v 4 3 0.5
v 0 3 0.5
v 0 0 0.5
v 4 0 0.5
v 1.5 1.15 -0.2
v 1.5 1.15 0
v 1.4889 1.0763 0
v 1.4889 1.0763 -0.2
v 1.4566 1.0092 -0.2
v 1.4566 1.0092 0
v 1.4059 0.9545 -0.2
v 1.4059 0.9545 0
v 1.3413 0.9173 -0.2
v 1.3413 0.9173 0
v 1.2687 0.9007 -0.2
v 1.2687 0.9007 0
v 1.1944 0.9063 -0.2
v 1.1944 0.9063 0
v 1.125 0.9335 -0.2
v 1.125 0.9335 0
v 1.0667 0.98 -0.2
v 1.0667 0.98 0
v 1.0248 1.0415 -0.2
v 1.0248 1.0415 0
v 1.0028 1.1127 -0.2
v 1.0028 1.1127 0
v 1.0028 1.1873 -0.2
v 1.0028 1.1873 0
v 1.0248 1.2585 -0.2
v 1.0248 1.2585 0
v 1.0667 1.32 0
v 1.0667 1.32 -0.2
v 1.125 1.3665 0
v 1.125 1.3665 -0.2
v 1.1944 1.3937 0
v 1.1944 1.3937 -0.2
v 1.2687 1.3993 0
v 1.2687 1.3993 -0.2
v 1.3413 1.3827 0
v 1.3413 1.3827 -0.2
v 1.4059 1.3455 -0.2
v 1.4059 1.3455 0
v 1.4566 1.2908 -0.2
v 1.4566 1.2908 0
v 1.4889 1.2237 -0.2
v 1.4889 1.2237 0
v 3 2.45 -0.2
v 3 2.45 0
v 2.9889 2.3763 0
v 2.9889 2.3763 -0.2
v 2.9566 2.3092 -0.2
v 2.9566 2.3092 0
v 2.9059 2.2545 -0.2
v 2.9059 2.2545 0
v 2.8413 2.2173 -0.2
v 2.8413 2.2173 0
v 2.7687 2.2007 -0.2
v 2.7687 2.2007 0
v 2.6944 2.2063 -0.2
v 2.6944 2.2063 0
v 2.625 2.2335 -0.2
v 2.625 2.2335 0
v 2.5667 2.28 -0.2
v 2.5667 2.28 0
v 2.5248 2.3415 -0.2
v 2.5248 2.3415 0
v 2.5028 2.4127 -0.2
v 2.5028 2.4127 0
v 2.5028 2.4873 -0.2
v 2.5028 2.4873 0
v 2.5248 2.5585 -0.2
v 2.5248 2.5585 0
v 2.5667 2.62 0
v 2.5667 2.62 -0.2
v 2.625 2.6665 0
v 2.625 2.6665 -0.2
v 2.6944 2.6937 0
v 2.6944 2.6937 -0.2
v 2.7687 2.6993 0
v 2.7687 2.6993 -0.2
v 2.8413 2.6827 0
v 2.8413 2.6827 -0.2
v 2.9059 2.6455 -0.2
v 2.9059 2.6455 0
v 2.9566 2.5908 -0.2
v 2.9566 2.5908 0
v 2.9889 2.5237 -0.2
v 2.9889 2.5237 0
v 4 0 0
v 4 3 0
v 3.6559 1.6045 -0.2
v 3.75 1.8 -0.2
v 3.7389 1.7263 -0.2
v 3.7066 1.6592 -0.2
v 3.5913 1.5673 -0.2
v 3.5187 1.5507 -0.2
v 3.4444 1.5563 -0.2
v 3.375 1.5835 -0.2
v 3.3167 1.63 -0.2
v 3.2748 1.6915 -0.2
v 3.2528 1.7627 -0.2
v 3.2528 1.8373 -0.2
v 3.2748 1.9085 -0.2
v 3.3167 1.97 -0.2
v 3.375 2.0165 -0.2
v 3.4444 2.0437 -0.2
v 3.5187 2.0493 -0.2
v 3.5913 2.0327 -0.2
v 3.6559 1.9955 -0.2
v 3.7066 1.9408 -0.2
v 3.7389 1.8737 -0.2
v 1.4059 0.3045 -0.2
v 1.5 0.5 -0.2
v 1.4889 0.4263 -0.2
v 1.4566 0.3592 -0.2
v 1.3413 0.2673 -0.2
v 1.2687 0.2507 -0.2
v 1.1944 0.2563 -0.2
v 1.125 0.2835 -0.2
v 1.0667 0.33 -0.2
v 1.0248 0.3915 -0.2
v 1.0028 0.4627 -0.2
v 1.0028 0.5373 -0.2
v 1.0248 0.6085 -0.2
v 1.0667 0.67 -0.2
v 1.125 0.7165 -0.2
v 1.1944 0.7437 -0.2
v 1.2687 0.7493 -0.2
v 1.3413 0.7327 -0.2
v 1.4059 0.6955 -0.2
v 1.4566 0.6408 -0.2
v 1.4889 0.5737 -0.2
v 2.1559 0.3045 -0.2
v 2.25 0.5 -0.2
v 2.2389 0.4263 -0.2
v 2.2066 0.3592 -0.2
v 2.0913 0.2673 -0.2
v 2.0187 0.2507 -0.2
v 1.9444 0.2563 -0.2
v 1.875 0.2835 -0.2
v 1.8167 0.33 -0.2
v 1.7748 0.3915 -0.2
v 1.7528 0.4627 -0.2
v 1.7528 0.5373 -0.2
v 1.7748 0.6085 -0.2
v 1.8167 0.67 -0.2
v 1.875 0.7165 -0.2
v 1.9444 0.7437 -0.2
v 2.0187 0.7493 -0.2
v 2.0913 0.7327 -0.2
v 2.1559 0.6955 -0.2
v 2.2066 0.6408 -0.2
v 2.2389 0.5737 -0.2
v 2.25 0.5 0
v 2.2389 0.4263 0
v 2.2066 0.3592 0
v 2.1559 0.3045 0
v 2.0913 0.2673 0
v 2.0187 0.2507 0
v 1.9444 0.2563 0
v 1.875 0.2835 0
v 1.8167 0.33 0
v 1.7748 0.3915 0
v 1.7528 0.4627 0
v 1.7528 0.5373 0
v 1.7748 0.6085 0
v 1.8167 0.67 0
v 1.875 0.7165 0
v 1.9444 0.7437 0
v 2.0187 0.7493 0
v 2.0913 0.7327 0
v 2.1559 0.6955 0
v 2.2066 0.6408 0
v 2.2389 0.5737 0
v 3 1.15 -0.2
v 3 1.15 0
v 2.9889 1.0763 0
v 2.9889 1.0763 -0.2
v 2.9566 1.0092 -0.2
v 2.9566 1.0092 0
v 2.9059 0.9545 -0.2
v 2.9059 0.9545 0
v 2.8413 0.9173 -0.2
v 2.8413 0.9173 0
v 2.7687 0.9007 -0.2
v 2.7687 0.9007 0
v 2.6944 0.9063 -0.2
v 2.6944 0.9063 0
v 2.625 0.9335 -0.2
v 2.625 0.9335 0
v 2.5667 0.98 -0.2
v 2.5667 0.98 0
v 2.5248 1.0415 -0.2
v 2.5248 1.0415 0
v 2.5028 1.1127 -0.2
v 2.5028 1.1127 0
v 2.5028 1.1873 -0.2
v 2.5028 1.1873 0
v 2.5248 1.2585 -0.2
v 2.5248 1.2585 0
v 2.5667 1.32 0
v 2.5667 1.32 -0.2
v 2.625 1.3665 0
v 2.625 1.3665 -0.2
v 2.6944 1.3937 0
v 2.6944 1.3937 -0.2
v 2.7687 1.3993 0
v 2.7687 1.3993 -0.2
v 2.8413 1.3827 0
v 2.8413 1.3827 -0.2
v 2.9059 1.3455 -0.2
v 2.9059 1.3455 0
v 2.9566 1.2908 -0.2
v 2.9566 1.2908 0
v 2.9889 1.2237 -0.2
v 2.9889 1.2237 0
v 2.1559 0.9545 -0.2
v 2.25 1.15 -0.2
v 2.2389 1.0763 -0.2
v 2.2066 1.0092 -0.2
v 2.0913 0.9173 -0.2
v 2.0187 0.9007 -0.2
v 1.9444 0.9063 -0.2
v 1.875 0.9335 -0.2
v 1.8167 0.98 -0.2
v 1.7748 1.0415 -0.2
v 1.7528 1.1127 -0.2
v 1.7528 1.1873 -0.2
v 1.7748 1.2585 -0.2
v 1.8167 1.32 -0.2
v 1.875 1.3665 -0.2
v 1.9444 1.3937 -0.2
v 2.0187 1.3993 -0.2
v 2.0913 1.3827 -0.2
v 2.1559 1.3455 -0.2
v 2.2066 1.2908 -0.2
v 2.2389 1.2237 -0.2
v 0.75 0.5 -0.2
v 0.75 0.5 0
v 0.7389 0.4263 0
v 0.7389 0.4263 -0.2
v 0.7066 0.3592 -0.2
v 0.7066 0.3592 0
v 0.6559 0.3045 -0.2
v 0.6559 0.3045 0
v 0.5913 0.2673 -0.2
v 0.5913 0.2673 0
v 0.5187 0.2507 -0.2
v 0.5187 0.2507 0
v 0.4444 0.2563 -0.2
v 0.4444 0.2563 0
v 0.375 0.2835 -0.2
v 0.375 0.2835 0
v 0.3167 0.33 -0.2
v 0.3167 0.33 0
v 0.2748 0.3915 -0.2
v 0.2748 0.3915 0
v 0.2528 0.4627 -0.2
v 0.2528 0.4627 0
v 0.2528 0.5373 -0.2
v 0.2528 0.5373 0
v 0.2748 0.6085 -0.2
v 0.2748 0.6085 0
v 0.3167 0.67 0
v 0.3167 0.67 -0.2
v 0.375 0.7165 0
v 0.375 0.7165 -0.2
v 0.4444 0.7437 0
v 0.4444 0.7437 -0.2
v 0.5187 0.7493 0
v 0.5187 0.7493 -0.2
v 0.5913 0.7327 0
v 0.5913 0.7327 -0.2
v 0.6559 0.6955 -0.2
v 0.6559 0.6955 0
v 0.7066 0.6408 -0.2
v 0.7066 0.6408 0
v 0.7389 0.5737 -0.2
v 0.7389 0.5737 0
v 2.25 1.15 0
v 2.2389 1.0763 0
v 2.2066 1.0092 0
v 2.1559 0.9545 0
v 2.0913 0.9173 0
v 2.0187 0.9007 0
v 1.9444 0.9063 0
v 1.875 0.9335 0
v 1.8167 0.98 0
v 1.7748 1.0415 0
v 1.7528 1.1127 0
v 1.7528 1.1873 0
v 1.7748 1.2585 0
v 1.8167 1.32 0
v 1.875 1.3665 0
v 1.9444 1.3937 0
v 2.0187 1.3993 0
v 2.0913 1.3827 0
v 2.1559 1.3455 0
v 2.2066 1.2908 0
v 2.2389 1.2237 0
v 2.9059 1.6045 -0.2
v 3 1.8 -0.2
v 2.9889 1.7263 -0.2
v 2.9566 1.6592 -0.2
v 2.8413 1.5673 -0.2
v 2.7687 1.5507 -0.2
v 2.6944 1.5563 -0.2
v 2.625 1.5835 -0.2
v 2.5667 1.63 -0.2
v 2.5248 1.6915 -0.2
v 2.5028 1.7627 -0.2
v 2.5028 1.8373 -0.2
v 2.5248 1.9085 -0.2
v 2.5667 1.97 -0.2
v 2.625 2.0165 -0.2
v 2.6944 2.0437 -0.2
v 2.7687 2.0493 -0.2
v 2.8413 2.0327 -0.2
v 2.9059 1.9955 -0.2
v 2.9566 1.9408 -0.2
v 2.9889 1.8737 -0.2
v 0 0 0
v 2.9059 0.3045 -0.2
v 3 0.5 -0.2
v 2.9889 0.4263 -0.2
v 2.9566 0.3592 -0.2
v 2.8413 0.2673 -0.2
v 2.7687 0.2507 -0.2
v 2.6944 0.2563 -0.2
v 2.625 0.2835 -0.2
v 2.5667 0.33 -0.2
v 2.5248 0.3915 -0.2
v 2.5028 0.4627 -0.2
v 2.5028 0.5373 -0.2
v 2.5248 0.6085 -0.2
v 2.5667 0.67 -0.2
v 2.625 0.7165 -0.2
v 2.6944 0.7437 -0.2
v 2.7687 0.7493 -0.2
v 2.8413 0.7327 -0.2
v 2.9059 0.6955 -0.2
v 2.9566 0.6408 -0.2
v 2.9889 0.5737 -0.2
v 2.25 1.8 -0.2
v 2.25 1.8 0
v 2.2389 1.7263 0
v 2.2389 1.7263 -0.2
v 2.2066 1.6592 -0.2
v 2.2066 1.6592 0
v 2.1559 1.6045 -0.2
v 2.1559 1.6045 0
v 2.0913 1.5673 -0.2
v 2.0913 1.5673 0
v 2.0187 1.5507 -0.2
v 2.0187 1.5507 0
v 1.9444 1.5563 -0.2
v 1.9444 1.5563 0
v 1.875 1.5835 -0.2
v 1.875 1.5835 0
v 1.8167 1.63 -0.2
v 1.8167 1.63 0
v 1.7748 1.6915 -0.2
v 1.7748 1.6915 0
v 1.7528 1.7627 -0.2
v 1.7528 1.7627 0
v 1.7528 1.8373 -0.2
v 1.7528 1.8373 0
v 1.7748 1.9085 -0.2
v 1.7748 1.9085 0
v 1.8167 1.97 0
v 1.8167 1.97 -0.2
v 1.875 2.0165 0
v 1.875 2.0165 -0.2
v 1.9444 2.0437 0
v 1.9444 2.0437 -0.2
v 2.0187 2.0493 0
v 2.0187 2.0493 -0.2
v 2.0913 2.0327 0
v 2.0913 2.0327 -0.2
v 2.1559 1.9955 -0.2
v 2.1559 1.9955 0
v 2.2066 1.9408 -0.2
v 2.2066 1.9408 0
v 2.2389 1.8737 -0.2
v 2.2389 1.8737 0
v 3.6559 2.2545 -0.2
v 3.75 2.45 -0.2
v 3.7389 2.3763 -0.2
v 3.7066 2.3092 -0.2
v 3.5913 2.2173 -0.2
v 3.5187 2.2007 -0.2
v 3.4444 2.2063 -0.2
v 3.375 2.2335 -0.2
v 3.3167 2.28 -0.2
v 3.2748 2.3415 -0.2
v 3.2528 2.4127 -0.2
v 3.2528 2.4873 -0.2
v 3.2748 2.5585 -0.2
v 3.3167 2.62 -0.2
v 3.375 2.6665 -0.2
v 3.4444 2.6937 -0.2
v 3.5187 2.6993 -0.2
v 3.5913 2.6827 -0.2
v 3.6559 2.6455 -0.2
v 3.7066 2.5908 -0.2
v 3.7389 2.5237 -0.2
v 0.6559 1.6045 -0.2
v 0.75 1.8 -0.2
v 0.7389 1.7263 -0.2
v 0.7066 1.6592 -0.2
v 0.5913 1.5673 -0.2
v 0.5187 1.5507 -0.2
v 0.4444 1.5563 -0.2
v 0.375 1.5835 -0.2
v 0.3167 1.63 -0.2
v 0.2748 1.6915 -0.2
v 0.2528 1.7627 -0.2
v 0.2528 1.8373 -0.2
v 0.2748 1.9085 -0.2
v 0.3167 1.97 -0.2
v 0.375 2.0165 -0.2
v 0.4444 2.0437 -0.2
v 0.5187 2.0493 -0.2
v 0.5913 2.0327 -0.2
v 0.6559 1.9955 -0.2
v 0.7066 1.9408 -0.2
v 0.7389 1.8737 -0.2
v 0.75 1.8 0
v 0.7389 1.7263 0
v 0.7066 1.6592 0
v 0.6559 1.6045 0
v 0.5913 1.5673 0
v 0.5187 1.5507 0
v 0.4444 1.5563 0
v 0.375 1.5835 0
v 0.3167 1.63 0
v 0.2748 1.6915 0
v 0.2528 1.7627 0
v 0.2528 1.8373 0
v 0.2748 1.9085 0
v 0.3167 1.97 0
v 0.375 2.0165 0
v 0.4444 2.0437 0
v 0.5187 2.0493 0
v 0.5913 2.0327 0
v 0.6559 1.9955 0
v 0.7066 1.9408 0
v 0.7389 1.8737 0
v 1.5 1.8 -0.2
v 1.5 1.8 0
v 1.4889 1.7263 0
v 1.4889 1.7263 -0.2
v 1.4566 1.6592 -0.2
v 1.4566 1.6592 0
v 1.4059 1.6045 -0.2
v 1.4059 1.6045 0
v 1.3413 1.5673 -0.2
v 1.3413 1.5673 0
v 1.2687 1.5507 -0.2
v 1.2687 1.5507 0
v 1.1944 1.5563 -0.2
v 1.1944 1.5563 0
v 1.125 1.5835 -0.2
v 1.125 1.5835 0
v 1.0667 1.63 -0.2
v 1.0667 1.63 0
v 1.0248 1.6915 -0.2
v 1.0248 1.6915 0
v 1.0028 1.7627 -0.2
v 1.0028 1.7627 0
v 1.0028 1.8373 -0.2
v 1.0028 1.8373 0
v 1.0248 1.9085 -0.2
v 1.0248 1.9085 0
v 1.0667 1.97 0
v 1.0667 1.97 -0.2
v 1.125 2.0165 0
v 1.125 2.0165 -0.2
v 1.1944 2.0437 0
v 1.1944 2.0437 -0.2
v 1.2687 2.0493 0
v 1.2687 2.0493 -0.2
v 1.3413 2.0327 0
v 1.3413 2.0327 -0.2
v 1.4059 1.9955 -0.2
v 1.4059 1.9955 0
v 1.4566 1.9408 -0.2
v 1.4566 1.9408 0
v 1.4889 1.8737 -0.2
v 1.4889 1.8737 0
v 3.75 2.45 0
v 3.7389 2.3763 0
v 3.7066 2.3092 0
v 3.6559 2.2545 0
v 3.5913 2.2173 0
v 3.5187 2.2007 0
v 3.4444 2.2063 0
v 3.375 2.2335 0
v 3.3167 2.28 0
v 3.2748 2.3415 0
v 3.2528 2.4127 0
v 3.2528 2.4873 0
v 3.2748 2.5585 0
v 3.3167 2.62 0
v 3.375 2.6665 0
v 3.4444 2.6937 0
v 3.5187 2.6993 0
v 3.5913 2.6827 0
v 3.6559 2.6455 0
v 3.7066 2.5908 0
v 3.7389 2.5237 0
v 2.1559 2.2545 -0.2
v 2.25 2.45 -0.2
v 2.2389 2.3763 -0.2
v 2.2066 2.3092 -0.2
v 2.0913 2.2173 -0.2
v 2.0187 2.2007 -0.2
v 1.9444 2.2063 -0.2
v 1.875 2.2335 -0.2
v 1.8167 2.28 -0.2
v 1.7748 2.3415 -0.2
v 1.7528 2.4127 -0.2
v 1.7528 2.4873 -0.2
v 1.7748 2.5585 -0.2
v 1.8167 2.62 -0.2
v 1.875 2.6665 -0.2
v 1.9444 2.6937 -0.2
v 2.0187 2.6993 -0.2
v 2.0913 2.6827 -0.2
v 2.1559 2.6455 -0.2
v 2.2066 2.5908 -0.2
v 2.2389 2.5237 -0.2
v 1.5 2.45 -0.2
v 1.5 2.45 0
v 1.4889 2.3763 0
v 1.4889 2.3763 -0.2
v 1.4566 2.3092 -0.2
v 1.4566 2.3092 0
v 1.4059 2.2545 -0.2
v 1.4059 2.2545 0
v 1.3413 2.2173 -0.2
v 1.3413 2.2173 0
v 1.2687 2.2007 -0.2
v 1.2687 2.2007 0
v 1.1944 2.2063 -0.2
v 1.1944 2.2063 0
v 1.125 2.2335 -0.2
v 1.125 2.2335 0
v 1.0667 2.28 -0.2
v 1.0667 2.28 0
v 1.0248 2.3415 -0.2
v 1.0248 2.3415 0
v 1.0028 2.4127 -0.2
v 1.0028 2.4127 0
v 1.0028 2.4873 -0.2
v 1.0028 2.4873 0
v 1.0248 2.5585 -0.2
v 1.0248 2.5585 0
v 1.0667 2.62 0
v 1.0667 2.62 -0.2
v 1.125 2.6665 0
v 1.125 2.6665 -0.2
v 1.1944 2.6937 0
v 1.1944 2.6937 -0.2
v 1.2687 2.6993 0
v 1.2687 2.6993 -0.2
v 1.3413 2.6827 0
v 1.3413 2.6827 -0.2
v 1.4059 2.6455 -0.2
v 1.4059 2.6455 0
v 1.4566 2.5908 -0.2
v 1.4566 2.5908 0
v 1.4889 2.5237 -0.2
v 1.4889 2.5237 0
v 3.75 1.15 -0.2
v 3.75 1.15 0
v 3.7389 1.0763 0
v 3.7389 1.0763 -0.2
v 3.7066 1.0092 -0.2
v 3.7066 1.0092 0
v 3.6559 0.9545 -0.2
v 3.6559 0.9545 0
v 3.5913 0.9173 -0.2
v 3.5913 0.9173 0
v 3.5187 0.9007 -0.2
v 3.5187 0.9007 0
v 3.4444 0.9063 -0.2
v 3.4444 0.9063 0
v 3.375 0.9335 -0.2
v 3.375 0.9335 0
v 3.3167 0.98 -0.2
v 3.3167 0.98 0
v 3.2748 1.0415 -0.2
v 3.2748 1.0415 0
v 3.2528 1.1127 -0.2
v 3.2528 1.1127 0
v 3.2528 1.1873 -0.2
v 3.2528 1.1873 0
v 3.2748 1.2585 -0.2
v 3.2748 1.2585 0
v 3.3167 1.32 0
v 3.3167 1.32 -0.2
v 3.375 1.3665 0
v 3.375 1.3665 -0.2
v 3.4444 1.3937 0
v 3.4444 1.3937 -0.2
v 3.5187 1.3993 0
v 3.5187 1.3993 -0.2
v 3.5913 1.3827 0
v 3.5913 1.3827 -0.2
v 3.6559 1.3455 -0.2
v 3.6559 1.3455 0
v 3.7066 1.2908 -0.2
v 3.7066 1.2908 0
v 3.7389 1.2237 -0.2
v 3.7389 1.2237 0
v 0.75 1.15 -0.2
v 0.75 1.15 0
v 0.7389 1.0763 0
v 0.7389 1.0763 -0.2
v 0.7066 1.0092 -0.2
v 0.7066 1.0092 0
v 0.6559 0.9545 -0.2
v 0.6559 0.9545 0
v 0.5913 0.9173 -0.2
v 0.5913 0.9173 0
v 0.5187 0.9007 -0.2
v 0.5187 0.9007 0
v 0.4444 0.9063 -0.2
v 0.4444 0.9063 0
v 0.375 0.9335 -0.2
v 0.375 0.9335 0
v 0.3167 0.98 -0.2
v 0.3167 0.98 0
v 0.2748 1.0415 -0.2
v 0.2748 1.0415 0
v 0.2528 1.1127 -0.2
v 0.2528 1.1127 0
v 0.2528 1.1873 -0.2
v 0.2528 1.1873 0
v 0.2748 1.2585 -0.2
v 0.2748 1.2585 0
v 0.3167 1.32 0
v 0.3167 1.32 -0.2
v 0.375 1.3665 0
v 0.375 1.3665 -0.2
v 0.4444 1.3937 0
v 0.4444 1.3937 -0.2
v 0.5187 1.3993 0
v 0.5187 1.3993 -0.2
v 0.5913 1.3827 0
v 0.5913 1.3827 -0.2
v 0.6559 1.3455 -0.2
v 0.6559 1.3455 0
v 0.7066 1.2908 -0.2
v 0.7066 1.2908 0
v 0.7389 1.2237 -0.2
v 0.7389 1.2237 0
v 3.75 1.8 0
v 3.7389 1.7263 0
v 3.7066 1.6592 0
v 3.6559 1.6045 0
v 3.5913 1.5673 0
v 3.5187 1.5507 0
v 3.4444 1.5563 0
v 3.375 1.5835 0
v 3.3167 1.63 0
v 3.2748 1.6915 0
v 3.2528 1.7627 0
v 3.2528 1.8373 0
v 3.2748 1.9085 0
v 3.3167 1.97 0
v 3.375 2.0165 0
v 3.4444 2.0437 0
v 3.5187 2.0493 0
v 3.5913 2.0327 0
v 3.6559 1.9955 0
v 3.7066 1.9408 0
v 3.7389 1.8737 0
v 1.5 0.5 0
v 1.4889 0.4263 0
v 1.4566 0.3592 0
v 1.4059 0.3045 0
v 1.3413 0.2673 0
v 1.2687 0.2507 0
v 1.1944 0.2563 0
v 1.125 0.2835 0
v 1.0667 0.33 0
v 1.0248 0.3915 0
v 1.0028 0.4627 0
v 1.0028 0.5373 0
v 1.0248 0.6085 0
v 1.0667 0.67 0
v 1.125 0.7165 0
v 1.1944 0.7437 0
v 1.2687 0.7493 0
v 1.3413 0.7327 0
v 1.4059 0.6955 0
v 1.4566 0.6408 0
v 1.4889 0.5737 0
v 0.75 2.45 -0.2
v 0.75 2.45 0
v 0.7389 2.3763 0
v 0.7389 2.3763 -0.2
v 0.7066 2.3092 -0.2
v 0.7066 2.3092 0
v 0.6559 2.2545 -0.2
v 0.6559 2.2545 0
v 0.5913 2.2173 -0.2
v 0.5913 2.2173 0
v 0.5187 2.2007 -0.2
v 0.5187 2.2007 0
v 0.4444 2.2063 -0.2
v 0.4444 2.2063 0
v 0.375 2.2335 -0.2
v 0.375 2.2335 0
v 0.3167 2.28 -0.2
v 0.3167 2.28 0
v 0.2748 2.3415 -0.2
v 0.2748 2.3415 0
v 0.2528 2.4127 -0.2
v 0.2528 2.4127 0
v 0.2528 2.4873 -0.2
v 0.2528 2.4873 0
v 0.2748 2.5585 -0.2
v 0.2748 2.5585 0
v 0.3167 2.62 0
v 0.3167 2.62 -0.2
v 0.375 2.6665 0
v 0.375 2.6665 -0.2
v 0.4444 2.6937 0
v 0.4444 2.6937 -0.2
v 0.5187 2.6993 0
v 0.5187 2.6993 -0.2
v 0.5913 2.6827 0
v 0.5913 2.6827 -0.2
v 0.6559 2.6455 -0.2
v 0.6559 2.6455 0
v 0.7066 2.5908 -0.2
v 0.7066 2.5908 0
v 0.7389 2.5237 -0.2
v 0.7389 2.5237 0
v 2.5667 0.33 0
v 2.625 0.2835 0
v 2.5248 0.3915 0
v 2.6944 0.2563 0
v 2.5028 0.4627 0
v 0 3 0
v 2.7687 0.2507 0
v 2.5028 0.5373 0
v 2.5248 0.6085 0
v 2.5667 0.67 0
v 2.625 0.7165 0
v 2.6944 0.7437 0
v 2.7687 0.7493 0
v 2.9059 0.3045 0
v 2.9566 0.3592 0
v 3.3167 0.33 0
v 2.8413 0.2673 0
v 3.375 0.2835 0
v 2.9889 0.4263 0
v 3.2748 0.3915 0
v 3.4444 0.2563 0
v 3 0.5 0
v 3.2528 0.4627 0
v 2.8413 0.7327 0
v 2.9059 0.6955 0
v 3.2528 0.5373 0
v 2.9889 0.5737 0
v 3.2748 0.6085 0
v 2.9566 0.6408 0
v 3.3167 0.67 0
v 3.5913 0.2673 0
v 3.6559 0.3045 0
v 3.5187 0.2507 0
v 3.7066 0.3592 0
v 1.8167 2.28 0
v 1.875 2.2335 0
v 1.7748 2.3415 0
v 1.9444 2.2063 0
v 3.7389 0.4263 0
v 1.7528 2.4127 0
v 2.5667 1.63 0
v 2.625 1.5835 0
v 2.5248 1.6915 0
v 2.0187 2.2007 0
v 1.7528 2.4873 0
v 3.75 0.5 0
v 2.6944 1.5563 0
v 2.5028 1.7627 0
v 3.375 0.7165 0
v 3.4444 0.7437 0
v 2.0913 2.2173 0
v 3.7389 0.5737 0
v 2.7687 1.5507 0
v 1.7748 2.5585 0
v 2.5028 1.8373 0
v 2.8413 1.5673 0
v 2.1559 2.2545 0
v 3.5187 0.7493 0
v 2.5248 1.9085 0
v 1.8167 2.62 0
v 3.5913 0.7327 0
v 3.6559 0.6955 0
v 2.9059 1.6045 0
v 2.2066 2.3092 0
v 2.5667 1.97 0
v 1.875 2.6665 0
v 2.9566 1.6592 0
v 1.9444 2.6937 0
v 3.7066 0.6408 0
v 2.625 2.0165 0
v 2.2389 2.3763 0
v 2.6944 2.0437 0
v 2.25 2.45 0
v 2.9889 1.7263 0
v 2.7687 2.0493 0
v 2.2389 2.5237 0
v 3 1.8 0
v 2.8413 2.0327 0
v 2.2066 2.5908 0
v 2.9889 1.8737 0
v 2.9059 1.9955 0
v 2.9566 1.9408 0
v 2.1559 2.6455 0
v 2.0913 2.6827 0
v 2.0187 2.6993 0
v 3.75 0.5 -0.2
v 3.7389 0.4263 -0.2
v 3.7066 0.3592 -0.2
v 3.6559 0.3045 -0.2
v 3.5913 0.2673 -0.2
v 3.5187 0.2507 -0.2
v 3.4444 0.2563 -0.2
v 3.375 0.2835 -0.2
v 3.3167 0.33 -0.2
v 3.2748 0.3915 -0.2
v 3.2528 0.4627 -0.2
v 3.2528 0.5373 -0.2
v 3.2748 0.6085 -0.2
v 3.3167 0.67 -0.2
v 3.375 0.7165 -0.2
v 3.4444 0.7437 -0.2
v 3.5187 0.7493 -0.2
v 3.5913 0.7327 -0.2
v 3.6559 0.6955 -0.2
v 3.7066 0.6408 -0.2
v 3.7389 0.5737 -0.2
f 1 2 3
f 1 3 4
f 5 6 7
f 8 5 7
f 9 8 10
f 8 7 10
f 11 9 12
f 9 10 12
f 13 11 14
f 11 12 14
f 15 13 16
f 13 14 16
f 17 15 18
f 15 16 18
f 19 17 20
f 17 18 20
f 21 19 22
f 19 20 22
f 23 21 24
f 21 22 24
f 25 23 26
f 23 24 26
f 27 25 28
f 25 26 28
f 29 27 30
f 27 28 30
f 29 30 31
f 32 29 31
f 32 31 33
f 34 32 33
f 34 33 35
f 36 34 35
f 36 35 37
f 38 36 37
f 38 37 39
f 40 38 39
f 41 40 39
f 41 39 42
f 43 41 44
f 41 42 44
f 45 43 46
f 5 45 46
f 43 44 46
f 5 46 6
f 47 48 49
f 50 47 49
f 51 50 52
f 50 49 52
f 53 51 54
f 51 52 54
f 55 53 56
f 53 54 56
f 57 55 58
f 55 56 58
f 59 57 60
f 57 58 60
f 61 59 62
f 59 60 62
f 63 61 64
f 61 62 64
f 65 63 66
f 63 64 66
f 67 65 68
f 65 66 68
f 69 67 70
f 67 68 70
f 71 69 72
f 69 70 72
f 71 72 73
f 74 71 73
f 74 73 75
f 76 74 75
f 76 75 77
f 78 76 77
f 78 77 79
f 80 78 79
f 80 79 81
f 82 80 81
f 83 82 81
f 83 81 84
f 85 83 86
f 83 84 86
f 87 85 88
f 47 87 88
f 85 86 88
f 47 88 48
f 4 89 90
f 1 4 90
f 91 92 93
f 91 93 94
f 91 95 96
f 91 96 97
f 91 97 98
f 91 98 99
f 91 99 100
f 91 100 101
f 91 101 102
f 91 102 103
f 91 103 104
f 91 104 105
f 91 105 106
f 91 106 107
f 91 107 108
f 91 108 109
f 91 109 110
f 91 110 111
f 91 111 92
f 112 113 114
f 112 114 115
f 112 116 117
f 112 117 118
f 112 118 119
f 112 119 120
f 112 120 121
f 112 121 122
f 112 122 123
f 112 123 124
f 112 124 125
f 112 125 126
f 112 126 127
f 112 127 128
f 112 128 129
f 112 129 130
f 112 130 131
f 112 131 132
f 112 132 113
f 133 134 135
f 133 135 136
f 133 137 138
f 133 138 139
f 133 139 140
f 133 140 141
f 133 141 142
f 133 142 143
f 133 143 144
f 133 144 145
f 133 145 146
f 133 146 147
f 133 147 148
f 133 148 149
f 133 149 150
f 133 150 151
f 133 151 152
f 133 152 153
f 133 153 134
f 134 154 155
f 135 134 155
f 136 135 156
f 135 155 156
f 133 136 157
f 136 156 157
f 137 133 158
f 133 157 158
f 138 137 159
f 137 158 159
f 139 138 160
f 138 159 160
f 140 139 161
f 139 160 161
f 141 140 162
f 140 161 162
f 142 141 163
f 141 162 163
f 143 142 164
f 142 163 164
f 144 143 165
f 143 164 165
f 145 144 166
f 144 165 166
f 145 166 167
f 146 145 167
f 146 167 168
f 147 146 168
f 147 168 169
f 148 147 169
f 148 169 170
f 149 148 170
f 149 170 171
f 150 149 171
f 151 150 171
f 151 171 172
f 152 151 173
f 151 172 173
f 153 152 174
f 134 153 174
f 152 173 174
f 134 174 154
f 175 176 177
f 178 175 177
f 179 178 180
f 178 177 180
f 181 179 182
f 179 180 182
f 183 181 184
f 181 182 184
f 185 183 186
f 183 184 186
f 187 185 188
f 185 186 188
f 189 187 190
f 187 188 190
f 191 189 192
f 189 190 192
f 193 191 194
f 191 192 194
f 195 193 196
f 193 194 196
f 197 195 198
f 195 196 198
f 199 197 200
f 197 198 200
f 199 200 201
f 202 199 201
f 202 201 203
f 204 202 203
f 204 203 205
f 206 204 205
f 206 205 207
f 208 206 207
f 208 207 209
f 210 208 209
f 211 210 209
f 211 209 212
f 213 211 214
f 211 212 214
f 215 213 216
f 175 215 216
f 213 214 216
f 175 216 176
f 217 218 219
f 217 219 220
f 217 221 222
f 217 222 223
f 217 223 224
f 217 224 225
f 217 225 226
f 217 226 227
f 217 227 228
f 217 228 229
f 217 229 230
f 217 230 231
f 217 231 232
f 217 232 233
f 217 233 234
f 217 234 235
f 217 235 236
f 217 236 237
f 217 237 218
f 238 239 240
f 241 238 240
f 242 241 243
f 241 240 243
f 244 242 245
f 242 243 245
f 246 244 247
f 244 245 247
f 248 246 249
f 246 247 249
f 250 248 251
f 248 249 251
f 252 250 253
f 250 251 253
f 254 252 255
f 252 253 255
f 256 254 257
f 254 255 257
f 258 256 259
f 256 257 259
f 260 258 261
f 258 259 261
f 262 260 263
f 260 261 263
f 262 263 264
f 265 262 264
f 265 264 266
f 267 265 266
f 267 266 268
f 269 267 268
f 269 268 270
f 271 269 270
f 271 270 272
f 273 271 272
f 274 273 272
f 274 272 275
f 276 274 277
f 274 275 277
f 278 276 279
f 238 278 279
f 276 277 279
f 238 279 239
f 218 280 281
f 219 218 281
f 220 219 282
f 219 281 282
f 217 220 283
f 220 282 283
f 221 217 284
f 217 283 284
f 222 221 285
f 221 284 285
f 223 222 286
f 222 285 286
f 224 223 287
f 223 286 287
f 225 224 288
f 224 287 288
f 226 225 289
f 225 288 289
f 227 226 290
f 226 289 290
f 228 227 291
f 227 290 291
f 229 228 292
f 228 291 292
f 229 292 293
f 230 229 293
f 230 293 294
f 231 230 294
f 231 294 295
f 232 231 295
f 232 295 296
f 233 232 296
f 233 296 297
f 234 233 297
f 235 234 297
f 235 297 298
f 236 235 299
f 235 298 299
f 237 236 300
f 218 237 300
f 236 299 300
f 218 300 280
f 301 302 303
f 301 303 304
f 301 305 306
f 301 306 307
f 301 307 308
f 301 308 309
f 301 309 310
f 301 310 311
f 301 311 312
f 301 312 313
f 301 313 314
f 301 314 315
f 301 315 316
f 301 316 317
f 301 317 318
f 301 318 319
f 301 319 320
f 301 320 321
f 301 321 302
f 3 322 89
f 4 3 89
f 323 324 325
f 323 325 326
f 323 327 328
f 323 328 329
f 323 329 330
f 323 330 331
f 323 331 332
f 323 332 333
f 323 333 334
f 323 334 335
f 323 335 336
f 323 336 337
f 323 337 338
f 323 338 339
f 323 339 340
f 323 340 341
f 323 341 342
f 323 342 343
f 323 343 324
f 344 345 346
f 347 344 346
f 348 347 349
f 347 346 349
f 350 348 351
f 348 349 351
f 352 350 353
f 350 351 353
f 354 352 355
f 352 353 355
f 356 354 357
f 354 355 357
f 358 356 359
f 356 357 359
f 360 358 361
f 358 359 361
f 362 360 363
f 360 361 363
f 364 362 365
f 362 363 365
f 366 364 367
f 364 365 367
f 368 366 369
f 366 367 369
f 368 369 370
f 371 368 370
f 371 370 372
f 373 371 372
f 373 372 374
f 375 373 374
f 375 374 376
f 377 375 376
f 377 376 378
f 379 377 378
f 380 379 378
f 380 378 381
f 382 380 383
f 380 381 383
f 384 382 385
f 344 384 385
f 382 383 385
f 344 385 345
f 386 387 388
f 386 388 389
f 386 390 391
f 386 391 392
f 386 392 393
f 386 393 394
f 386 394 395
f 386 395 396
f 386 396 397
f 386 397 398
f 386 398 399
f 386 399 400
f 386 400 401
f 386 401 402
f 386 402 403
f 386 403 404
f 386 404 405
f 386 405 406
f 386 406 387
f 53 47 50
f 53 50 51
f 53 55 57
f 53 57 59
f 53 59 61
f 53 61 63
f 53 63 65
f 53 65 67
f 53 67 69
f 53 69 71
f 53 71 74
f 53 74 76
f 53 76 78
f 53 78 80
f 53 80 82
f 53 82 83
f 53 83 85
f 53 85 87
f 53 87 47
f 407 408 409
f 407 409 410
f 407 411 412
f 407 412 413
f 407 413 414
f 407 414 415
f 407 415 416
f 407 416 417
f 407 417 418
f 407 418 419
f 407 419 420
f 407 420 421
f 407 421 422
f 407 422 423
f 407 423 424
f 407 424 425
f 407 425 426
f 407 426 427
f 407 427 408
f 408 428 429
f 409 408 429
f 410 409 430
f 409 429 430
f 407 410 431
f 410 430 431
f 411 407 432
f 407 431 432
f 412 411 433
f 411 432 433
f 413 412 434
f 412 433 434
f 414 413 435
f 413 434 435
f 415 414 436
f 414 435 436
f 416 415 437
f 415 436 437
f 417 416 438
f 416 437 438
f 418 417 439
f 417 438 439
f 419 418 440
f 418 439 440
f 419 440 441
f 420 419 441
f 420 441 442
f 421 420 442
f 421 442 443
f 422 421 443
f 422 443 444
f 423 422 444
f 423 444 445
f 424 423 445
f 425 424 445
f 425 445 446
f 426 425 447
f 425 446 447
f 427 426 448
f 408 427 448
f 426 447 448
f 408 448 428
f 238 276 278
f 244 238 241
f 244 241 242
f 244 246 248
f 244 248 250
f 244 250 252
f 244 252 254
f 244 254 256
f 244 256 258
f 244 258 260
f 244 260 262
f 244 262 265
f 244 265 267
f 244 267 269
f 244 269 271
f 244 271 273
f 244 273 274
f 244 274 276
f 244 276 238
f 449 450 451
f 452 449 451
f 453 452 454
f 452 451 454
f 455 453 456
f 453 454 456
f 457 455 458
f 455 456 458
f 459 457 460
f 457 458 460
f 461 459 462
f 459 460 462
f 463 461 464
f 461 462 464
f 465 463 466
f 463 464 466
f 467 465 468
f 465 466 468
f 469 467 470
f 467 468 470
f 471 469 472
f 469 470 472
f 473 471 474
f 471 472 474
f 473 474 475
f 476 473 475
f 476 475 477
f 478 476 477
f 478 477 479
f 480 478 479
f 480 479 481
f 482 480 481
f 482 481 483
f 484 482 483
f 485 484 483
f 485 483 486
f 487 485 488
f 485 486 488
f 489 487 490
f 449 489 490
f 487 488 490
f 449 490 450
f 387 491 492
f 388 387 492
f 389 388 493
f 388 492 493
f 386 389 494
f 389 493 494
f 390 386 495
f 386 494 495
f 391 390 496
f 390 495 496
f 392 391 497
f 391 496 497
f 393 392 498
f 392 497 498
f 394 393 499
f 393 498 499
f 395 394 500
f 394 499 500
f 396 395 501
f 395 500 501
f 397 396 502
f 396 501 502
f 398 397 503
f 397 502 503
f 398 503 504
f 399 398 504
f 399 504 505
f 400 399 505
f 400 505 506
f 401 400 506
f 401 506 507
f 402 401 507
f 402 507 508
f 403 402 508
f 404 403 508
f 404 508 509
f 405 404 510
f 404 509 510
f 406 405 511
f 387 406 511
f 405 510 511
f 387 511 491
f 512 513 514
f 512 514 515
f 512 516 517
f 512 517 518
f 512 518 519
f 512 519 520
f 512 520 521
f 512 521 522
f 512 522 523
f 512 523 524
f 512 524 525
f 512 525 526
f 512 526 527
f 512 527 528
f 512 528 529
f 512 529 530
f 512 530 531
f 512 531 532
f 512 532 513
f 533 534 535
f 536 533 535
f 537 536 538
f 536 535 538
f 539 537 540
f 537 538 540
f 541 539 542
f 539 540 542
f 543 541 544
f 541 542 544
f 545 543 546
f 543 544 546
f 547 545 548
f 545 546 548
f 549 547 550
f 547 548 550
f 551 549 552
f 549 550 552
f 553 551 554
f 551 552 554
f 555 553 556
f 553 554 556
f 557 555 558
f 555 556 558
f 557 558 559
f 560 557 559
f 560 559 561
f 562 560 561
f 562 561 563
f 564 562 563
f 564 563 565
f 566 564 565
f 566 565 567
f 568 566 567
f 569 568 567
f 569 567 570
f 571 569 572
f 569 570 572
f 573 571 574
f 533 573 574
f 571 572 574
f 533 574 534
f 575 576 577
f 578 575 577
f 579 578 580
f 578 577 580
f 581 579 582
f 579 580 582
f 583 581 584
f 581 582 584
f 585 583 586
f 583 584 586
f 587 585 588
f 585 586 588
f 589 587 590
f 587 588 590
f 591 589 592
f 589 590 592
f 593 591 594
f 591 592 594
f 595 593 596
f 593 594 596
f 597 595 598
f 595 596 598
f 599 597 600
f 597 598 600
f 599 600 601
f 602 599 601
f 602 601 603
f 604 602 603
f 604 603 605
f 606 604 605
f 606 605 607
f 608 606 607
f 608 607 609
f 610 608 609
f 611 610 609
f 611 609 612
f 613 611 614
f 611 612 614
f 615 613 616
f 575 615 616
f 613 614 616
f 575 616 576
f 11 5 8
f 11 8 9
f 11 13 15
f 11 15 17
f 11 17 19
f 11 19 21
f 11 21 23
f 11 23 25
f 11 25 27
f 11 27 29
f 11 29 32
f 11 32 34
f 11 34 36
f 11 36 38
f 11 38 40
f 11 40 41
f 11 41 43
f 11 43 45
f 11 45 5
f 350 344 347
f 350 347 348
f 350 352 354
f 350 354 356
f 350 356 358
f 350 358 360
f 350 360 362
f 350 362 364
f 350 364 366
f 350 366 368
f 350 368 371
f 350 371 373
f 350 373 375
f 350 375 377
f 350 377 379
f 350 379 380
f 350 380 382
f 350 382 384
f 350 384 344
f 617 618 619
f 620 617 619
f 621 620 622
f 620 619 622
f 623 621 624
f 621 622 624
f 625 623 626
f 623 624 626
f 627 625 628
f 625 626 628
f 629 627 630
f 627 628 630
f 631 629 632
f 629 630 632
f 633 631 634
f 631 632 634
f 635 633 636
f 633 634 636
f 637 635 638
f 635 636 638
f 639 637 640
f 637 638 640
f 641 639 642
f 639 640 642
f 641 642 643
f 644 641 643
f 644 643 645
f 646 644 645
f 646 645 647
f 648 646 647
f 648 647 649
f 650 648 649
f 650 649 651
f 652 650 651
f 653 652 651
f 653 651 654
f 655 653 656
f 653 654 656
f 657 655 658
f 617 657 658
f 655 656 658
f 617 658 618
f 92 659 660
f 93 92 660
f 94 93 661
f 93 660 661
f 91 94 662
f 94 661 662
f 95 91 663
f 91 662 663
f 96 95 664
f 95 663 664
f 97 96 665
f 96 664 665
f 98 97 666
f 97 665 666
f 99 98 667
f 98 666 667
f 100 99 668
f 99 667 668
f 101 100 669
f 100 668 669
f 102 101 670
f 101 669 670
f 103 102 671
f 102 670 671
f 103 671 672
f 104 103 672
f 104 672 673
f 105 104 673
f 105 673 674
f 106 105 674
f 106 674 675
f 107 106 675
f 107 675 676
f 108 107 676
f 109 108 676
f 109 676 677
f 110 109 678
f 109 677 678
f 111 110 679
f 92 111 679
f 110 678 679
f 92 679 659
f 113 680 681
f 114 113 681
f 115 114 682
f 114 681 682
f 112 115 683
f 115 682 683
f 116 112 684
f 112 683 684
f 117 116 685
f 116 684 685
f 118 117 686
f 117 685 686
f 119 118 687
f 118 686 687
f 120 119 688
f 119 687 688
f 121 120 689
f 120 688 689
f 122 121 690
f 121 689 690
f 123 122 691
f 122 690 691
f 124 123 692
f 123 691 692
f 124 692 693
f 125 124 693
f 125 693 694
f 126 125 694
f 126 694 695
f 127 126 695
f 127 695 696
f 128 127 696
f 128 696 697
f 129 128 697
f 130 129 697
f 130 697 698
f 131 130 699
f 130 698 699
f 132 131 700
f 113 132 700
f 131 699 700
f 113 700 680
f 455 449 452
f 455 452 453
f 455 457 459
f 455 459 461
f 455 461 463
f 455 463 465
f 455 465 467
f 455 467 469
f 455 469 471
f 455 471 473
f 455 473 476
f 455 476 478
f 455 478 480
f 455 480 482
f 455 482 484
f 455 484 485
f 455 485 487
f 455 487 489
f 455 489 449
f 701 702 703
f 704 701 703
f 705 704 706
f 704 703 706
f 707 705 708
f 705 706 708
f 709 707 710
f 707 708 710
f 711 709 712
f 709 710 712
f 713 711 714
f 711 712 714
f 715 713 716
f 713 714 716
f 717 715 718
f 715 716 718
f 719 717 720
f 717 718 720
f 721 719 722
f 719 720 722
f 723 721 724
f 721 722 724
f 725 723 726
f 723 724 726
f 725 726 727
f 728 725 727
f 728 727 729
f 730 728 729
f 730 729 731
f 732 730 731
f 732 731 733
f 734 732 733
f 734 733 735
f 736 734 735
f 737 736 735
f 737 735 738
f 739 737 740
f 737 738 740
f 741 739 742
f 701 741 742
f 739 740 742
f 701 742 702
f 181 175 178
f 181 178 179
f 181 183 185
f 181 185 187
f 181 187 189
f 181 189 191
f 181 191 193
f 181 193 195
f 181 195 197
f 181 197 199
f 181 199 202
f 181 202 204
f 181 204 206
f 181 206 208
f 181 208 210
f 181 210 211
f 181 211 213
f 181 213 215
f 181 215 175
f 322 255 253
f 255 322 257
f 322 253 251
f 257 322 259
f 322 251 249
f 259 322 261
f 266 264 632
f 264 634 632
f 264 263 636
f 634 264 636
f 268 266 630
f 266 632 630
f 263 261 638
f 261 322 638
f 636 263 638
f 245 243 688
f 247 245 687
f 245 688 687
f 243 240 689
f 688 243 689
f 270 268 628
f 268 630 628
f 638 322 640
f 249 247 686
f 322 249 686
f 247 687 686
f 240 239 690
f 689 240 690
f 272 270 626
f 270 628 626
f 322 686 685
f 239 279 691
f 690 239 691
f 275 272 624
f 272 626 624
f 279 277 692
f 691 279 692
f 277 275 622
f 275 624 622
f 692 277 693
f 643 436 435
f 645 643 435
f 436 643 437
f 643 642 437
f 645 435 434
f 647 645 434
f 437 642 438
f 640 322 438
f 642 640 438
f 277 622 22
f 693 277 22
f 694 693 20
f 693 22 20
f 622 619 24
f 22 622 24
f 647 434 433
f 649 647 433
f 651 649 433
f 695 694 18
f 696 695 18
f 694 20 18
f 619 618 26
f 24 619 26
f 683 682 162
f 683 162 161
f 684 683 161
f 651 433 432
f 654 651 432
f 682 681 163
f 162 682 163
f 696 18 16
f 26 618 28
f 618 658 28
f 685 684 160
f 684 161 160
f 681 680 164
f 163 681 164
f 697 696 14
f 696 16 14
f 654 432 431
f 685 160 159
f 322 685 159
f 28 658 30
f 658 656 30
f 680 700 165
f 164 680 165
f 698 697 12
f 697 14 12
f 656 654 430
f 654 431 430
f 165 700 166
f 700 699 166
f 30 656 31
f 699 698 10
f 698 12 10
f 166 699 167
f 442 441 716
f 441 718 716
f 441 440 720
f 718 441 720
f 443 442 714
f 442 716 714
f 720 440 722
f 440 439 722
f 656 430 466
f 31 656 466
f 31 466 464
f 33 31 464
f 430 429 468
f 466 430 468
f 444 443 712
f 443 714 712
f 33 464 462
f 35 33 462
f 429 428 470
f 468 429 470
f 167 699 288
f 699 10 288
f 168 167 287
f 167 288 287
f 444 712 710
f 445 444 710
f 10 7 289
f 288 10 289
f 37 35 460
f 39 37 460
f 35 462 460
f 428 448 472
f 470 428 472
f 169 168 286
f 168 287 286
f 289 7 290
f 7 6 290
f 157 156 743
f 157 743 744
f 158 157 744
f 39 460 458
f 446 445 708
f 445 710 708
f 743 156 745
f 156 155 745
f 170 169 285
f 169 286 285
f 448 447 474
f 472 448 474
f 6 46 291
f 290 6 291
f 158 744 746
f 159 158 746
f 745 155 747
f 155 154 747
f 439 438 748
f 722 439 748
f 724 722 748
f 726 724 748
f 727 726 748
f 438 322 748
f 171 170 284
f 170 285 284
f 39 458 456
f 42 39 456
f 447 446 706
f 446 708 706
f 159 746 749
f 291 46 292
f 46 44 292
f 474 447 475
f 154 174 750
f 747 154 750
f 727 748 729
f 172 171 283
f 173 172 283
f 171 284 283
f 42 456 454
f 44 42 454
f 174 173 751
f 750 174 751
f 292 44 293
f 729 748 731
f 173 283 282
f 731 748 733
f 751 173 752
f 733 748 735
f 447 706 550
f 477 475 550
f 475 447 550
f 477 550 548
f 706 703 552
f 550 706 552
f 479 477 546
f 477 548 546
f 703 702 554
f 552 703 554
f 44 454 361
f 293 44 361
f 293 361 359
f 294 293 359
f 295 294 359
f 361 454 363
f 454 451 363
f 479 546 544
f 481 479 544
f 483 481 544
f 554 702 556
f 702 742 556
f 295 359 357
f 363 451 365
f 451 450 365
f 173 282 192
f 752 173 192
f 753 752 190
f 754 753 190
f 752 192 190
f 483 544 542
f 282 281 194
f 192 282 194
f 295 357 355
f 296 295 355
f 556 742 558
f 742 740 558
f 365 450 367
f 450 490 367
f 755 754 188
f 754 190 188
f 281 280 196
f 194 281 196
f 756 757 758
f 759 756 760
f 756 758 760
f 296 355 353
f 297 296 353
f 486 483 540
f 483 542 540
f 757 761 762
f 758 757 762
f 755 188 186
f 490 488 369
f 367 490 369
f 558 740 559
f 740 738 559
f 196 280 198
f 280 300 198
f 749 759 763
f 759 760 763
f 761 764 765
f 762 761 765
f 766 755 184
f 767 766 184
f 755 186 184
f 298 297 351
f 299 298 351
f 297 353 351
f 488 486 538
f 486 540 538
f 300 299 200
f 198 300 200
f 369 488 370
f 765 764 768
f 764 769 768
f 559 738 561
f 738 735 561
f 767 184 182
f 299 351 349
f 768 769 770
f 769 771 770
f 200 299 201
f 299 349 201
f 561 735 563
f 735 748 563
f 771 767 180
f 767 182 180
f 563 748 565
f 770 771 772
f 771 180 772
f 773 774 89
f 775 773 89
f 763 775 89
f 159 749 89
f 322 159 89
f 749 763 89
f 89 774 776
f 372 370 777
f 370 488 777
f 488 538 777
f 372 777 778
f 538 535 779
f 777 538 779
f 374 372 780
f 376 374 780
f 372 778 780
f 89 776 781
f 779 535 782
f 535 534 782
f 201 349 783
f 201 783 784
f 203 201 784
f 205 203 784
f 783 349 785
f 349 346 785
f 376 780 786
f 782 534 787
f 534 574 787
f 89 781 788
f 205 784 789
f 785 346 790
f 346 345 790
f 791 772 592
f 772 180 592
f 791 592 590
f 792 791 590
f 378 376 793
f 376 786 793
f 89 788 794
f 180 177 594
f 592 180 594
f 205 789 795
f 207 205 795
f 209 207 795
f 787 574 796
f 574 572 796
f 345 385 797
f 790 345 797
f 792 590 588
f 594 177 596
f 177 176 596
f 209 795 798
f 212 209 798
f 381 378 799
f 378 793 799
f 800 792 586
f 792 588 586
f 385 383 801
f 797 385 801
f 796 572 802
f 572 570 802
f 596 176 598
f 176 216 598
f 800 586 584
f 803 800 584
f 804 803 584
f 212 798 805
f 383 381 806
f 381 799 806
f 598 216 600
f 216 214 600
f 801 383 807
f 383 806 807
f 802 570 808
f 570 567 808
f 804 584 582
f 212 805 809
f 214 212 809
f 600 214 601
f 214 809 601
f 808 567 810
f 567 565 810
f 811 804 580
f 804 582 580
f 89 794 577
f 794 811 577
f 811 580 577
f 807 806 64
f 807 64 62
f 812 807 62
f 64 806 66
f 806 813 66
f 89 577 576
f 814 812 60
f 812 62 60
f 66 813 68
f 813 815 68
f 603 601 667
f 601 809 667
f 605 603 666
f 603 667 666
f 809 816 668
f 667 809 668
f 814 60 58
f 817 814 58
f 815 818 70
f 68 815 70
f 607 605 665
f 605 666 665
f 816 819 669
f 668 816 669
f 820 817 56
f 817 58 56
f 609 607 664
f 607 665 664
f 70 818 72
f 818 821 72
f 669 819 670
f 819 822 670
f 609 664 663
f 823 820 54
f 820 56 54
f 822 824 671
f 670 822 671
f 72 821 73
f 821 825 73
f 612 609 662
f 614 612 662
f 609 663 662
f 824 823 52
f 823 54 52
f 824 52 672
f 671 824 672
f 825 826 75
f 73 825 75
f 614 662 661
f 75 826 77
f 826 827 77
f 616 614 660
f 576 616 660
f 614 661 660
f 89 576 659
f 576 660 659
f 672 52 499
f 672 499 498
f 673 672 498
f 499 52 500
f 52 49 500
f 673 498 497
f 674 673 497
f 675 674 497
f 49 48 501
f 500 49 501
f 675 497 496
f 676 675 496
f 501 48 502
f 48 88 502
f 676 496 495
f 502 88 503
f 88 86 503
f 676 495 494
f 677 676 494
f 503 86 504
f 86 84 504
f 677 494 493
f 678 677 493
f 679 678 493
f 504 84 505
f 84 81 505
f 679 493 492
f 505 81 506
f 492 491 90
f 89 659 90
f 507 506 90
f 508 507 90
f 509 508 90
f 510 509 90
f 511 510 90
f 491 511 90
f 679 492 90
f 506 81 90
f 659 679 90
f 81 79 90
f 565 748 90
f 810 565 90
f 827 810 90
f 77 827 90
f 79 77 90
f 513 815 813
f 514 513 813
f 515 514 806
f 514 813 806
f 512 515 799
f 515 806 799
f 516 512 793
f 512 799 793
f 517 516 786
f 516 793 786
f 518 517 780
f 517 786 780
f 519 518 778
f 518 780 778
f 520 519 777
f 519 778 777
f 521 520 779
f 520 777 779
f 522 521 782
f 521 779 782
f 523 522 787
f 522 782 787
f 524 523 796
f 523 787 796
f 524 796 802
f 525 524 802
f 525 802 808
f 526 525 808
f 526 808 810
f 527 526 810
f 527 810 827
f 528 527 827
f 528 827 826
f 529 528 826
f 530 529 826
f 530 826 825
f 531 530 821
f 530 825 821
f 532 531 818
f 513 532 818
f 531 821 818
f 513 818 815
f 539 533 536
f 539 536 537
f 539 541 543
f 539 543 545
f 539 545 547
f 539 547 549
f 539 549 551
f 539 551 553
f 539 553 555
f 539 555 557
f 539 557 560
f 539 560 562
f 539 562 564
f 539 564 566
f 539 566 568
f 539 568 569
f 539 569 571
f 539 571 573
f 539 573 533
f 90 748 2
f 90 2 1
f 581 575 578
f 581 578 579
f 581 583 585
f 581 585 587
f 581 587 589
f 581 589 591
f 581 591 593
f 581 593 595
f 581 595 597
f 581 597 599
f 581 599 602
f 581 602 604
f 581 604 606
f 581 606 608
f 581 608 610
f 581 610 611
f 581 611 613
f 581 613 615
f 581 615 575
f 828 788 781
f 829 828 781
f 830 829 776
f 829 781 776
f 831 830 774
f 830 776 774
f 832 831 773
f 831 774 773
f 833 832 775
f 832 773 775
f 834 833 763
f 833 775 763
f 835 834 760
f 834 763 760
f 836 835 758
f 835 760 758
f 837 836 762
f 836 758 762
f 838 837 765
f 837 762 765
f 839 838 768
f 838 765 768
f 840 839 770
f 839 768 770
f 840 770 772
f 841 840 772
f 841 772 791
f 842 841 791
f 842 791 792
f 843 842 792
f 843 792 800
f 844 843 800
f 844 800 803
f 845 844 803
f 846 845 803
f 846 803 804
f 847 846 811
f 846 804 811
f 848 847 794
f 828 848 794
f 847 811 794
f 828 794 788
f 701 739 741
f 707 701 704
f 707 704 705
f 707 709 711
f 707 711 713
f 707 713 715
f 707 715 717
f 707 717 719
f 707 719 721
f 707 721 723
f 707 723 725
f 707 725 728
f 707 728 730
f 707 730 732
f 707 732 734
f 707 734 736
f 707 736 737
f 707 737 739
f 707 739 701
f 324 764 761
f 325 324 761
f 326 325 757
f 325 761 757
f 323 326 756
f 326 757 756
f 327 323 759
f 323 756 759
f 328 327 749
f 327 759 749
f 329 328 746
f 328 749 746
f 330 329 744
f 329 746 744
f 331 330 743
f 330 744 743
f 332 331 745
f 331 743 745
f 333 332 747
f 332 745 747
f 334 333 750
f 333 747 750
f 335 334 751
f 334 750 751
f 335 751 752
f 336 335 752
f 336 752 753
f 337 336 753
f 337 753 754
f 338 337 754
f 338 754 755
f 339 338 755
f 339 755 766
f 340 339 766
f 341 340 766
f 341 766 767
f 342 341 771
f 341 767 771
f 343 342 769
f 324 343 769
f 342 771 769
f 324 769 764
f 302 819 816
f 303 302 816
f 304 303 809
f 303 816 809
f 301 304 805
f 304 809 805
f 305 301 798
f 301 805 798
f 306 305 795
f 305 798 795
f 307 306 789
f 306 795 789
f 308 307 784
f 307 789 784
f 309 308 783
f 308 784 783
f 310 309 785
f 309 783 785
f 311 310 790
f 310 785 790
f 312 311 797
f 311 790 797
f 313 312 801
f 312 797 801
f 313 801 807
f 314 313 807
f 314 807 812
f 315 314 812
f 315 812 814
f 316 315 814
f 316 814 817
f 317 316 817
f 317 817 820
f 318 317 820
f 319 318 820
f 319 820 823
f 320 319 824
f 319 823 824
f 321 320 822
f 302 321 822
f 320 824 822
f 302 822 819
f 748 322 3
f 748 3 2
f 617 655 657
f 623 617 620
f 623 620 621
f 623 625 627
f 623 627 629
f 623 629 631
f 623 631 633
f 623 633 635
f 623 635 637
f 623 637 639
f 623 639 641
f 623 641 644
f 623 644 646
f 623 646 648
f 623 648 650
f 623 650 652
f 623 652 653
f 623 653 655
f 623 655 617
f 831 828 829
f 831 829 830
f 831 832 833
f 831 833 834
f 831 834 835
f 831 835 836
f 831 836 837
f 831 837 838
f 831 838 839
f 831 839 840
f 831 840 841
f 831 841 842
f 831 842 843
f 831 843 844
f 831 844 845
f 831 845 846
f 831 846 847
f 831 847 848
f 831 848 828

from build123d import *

# Parameters (mm, degrees)
F0_W     = 4
F0_H     = 3
F1_DEPTH = 0.5
F2_R     = 0.25
F3_DEPTH = 0.2


with BuildPart() as f1:
    # F0 (on Top) → F1 (new body)
    with BuildSketch(Plane.XY):
        with Locations((2, 1.5)):
            Rectangle(F0_W, F0_H)
    extrude(amount=F1_DEPTH)

    # F2 (on face) → F3 (join)
    with BuildSketch(Plane(origin=(0, 0, 0), x_dir=(1, 0, 0), z_dir=(0, 0, -1))):
        with Locations((0.5, -0.5)):
            Circle(F2_R)
        with Locations((1.25, -0.5)):
            Circle(F2_R)
        with Locations((2, -0.5)):
            Circle(F2_R)
        with Locations((2.75, -0.5)):
            Circle(F2_R)
        with Locations((3.5, -0.5)):
            Circle(F2_R)
        with Locations((2, -1.15)):
            Circle(F2_R)
        with Locations((2.75, -1.15)):
            Circle(F2_R)
        with Locations((3.5, -1.15)):
            Circle(F2_R)
        with Locations((0.5, -1.15)):
            Circle(F2_R)
        with Locations((1.25, -1.15)):
            Circle(F2_R)
        with Locations((2, -1.8)):
            Circle(F2_R)
        with Locations((2.75, -1.8)):
            Circle(F2_R)
        with Locations((3.5, -1.8)):
            Circle(F2_R)
        with Locations((0.5, -1.8)):
            Circle(F2_R)
        with Locations((1.25, -1.8)):
            Circle(F2_R)
        with Locations((2, -2.45)):
            Circle(F2_R)
        with Locations((2.75, -2.45)):
            Circle(F2_R)
        with Locations((3.5, -2.45)):
            Circle(F2_R)
        with Locations((0.5, -2.45)):
            Circle(F2_R)
        with Locations((1.25, -2.45)):
            Circle(F2_R)
    extrude(amount=F3_DEPTH)


solid = f1.part
